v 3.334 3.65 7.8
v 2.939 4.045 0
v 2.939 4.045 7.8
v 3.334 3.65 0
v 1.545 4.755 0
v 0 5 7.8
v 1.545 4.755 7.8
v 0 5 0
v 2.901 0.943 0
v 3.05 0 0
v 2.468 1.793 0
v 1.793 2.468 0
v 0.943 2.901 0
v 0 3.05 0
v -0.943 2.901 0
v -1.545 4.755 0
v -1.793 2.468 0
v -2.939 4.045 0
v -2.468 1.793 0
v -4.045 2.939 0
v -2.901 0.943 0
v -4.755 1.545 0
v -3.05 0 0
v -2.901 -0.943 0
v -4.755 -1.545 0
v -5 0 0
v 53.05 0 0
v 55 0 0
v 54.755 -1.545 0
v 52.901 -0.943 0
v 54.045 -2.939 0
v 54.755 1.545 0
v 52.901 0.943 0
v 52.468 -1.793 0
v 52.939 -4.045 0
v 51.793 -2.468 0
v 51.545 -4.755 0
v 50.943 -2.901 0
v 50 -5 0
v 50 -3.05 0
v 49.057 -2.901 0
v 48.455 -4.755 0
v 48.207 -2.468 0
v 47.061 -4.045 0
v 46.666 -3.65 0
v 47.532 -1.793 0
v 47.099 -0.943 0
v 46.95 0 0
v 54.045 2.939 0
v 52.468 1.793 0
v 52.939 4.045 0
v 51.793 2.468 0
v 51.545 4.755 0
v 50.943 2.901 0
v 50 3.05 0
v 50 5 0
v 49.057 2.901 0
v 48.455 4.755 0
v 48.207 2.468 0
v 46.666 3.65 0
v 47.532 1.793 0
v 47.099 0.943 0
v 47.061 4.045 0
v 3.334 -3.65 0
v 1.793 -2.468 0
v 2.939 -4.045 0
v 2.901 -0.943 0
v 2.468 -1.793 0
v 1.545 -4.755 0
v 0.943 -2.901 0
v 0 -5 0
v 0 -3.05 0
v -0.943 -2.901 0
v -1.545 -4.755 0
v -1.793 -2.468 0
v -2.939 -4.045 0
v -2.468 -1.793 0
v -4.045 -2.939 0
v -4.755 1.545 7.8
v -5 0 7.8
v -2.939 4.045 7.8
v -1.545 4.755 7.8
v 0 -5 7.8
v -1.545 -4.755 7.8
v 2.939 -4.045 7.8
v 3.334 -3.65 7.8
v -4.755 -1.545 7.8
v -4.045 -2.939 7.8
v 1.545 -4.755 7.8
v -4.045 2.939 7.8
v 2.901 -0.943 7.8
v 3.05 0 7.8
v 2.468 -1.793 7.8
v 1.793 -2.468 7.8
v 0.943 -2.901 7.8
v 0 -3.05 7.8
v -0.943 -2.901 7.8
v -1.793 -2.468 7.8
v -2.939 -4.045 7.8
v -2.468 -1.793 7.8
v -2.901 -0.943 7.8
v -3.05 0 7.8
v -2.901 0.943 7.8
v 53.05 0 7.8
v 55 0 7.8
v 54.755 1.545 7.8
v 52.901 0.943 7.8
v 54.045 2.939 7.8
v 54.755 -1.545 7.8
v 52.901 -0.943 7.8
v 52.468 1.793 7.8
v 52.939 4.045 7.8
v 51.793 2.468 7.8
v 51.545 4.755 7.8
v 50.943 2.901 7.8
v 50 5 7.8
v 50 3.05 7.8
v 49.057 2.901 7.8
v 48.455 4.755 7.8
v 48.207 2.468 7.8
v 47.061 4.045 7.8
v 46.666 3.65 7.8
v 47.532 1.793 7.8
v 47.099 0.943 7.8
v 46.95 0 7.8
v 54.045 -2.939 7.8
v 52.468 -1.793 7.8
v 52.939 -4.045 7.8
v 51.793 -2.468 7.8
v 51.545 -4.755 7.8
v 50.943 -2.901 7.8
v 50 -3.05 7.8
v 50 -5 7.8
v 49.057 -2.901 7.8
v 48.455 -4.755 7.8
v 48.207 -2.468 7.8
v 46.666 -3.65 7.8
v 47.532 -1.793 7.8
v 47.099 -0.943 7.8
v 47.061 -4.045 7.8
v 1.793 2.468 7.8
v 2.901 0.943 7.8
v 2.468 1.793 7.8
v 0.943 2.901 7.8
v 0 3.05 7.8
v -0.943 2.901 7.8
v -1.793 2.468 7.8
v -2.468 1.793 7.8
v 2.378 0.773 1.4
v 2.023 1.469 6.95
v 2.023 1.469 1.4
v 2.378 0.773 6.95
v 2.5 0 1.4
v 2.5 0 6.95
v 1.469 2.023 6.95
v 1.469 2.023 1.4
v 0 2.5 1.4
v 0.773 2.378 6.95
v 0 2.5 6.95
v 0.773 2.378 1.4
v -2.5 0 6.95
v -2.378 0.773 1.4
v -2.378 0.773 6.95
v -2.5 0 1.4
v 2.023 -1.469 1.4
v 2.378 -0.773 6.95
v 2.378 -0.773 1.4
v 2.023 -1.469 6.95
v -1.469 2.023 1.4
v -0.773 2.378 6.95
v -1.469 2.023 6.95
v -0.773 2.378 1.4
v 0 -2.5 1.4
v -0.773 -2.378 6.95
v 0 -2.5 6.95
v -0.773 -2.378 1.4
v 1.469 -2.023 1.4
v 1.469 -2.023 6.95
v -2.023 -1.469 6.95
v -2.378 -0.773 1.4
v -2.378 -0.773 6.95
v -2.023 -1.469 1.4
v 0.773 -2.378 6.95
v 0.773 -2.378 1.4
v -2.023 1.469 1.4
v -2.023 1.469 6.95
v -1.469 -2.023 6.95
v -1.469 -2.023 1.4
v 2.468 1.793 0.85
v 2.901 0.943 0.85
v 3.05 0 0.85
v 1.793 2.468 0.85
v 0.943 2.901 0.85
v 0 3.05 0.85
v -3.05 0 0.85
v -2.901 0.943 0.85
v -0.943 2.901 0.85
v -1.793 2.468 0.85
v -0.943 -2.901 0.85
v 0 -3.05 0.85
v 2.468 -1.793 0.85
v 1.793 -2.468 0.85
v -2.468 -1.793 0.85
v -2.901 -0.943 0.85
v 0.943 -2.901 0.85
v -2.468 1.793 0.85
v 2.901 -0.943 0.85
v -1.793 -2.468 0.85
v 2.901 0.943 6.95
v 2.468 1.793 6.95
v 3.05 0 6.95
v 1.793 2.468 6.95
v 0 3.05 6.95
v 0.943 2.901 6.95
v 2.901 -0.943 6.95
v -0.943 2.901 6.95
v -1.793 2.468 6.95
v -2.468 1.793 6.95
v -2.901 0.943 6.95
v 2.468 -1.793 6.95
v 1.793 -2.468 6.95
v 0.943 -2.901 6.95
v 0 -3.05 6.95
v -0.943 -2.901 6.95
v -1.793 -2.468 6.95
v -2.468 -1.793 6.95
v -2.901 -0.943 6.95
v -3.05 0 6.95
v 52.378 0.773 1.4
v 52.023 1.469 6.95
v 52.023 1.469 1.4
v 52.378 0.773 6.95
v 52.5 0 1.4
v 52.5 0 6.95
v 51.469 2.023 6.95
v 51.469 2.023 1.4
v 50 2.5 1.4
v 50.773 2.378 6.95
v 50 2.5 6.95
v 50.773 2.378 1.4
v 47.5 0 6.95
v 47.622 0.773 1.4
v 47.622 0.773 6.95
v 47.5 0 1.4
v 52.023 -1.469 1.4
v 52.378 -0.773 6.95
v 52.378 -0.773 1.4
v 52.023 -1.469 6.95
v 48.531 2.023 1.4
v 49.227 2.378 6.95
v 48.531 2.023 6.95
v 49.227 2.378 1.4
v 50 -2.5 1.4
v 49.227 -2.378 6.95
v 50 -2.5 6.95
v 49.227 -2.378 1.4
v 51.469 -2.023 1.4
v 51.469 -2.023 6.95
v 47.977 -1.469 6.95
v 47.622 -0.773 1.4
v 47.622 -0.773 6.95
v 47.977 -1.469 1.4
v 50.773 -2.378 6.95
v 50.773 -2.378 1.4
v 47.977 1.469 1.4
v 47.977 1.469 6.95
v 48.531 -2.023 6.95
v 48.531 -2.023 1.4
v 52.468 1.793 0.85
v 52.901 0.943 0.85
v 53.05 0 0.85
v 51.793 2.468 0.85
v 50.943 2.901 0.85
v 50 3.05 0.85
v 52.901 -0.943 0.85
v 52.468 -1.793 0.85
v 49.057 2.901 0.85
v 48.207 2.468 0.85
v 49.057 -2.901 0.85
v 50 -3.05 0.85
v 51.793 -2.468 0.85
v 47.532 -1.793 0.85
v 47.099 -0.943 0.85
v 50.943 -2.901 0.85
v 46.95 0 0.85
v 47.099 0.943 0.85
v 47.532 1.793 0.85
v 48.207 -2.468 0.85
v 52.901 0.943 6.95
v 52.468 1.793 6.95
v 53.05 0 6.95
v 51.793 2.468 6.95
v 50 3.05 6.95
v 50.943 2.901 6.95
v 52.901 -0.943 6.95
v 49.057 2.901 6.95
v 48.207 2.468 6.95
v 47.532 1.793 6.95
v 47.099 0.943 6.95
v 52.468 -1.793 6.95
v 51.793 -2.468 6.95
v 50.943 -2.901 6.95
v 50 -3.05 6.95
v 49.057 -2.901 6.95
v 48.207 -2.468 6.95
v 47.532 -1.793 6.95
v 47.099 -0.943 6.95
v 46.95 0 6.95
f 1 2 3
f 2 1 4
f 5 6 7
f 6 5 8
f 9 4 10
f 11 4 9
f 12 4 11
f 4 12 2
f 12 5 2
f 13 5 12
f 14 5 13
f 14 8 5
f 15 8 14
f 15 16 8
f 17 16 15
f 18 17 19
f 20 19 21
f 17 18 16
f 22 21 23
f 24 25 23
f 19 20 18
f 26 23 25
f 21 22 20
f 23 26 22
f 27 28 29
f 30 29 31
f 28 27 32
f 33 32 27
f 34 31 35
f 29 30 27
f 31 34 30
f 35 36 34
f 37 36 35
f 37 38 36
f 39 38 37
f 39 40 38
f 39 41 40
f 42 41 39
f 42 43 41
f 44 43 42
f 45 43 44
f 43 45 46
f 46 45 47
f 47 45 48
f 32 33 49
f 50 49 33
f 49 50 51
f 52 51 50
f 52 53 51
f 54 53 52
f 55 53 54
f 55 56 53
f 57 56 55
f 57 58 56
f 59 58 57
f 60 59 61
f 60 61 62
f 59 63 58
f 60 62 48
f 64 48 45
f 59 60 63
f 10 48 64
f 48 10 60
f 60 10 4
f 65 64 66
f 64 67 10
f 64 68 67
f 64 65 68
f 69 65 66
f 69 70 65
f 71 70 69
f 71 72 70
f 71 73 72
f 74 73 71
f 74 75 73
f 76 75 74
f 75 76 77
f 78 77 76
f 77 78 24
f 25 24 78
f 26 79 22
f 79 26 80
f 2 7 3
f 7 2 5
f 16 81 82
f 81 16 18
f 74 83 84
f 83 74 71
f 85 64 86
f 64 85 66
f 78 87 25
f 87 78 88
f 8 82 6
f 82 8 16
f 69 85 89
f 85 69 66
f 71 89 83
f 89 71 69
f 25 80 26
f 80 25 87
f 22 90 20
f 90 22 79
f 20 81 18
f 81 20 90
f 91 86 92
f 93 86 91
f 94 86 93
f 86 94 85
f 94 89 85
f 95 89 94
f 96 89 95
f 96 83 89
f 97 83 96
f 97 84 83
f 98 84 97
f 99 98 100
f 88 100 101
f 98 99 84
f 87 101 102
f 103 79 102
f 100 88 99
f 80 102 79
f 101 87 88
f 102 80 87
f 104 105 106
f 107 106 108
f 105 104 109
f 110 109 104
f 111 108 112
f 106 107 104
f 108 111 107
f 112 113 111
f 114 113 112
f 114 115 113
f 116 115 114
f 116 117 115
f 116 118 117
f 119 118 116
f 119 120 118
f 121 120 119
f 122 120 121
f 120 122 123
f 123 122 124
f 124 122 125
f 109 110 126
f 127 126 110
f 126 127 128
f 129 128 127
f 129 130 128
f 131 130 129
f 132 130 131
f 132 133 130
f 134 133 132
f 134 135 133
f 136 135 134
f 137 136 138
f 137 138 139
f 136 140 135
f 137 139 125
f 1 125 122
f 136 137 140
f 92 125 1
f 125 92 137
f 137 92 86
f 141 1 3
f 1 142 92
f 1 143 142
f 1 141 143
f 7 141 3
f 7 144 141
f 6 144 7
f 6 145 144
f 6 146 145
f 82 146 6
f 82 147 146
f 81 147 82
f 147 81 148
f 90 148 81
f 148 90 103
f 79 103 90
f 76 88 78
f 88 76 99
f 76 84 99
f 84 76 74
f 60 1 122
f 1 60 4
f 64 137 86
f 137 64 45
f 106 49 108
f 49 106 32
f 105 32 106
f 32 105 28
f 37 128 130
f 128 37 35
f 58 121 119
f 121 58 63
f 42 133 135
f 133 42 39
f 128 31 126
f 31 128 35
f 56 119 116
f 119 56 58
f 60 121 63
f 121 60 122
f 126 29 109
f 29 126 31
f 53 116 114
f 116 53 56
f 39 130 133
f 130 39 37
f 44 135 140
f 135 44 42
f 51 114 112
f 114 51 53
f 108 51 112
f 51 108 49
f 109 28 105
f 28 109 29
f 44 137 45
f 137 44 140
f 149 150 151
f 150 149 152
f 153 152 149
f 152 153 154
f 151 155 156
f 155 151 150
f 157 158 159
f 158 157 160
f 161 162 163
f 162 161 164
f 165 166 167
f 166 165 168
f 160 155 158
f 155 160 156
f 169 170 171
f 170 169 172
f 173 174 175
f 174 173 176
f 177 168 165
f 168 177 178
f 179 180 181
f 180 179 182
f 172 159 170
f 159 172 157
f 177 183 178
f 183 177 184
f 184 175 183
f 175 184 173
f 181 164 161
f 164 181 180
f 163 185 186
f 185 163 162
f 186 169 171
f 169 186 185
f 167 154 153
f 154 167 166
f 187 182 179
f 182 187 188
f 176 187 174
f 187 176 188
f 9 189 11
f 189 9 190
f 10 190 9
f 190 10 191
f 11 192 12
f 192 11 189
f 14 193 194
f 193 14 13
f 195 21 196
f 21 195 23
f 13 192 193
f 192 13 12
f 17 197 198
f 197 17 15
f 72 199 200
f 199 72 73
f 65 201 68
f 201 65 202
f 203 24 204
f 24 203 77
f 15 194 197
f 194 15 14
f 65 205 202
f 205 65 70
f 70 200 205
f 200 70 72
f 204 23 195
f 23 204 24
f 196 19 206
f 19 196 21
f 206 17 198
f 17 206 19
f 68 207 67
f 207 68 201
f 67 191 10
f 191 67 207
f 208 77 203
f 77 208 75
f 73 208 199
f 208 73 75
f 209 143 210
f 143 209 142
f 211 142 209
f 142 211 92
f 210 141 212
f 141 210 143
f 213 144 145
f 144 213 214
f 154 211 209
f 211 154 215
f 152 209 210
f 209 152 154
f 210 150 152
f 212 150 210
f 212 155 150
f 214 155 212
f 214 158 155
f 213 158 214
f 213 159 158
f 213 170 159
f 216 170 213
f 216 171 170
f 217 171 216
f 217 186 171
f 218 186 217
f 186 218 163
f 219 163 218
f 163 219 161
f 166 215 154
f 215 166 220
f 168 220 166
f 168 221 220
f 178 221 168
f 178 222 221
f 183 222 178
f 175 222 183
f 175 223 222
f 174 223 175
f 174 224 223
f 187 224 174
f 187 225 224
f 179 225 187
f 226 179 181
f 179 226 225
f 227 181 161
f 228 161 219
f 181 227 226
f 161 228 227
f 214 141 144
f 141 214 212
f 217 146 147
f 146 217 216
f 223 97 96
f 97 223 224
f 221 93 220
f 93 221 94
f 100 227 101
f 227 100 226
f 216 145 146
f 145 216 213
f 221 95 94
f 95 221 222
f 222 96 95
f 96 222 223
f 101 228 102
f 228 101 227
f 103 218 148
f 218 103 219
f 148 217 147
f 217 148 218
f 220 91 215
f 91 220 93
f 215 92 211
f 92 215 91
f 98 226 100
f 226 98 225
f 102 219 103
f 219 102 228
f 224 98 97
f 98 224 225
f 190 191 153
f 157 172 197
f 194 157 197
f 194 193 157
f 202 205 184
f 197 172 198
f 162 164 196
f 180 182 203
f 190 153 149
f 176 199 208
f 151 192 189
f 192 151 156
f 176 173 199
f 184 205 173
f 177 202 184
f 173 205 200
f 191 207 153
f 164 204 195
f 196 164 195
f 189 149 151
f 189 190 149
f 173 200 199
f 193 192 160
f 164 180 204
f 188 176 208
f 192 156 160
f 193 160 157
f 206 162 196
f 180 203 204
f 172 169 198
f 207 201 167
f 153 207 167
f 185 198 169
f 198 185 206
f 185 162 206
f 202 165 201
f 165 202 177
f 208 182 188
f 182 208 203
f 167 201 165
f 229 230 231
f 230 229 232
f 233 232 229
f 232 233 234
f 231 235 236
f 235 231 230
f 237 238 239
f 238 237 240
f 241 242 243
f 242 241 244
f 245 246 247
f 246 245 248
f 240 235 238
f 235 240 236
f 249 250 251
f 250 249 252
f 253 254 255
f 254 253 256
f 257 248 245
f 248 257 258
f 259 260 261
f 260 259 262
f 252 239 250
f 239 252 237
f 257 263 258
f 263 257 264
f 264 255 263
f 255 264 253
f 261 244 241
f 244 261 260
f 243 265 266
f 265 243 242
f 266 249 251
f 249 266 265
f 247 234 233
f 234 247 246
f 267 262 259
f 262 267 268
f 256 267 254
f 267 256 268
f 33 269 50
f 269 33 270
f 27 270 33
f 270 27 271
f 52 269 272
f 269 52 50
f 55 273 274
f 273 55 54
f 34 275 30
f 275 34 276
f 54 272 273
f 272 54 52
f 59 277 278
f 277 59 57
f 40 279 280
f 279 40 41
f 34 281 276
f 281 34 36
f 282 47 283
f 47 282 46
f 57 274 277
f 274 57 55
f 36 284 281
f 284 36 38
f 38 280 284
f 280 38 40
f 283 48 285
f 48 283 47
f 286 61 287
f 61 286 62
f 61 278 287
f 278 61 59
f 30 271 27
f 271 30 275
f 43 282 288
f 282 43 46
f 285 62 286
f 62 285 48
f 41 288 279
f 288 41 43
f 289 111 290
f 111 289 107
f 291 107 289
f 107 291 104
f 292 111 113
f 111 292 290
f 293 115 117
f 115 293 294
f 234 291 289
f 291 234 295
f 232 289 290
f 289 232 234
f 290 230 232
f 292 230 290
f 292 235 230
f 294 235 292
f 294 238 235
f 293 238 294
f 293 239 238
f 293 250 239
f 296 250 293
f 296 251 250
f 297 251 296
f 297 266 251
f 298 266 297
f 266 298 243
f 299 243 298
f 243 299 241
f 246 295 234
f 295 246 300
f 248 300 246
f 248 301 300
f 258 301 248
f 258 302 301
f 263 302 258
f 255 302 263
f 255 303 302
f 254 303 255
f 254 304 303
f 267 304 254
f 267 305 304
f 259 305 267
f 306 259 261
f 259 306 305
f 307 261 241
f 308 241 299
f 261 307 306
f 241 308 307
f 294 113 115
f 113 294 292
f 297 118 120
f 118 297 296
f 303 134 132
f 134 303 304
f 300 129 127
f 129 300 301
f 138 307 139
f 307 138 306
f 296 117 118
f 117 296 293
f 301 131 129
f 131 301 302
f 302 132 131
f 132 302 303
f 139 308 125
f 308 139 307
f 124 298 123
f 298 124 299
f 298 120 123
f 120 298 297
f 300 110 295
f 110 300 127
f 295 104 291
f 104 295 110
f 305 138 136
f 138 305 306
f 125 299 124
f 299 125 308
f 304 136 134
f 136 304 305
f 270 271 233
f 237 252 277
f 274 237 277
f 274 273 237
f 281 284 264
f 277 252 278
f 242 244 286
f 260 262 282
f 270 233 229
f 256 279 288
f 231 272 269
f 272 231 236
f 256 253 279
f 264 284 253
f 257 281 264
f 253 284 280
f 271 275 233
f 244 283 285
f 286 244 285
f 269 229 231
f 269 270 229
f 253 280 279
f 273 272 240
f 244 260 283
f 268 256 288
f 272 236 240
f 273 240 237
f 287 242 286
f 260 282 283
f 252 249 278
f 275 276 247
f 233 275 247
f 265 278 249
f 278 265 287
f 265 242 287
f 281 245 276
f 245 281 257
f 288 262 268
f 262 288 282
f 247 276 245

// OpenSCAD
/*      
Customizable freeform-2-hole LEGO Technic Connector Bone
Jens Henrik Sandell
July 2016
Updated December 2016

Created by forking the thing:629875
        Customizable Curved LEGO Technic Beam
        Steve Medwin
        January 2015
*/
$fn=20*1.0;
// preview[view:north east, tilt:top]

// constants
width = 7.3*1.0; // beam width
height = 7.8*1.0; // beam height
hole = 5.0/2; // hole diameter
counter = 6.1/2; // countersink diameter
depth = 0.85*1.0; // countersink depth
pitch = 8.0*1.0; // distance between holes

// user parameters
// distance between holes =
Distance1 = 50; // [20:100]
// width of knuckle and ends =
Knuckle = 10; // [8:16]

// calculations
// create beam
difference()
{
	union(){
		cylinder(h=height, r=Knuckle/2);
		translate([0,-width/2,0]) cube([Distance1,width,height]);
		translate([Distance1,0,0]) cylinder(h=height,r=Knuckle/2);
	}
	for (i=[0:1]) {
		translate([i*Distance1,0,0]) {
			translate([0,0,-2])
			cylinder(h=height+4, r=hole);
                
			translate([0,0,-0.01])
			cylinder(h=depth+0.01, r=counter);      
                
			translate([0,0,height-depth])
			cylinder(h=depth+0.01, r=counter);
                
			translate([0,0,depth])
			cylinder(h=(counter - hole), r1=counter, r2=hole);           
		}    
	}
}

